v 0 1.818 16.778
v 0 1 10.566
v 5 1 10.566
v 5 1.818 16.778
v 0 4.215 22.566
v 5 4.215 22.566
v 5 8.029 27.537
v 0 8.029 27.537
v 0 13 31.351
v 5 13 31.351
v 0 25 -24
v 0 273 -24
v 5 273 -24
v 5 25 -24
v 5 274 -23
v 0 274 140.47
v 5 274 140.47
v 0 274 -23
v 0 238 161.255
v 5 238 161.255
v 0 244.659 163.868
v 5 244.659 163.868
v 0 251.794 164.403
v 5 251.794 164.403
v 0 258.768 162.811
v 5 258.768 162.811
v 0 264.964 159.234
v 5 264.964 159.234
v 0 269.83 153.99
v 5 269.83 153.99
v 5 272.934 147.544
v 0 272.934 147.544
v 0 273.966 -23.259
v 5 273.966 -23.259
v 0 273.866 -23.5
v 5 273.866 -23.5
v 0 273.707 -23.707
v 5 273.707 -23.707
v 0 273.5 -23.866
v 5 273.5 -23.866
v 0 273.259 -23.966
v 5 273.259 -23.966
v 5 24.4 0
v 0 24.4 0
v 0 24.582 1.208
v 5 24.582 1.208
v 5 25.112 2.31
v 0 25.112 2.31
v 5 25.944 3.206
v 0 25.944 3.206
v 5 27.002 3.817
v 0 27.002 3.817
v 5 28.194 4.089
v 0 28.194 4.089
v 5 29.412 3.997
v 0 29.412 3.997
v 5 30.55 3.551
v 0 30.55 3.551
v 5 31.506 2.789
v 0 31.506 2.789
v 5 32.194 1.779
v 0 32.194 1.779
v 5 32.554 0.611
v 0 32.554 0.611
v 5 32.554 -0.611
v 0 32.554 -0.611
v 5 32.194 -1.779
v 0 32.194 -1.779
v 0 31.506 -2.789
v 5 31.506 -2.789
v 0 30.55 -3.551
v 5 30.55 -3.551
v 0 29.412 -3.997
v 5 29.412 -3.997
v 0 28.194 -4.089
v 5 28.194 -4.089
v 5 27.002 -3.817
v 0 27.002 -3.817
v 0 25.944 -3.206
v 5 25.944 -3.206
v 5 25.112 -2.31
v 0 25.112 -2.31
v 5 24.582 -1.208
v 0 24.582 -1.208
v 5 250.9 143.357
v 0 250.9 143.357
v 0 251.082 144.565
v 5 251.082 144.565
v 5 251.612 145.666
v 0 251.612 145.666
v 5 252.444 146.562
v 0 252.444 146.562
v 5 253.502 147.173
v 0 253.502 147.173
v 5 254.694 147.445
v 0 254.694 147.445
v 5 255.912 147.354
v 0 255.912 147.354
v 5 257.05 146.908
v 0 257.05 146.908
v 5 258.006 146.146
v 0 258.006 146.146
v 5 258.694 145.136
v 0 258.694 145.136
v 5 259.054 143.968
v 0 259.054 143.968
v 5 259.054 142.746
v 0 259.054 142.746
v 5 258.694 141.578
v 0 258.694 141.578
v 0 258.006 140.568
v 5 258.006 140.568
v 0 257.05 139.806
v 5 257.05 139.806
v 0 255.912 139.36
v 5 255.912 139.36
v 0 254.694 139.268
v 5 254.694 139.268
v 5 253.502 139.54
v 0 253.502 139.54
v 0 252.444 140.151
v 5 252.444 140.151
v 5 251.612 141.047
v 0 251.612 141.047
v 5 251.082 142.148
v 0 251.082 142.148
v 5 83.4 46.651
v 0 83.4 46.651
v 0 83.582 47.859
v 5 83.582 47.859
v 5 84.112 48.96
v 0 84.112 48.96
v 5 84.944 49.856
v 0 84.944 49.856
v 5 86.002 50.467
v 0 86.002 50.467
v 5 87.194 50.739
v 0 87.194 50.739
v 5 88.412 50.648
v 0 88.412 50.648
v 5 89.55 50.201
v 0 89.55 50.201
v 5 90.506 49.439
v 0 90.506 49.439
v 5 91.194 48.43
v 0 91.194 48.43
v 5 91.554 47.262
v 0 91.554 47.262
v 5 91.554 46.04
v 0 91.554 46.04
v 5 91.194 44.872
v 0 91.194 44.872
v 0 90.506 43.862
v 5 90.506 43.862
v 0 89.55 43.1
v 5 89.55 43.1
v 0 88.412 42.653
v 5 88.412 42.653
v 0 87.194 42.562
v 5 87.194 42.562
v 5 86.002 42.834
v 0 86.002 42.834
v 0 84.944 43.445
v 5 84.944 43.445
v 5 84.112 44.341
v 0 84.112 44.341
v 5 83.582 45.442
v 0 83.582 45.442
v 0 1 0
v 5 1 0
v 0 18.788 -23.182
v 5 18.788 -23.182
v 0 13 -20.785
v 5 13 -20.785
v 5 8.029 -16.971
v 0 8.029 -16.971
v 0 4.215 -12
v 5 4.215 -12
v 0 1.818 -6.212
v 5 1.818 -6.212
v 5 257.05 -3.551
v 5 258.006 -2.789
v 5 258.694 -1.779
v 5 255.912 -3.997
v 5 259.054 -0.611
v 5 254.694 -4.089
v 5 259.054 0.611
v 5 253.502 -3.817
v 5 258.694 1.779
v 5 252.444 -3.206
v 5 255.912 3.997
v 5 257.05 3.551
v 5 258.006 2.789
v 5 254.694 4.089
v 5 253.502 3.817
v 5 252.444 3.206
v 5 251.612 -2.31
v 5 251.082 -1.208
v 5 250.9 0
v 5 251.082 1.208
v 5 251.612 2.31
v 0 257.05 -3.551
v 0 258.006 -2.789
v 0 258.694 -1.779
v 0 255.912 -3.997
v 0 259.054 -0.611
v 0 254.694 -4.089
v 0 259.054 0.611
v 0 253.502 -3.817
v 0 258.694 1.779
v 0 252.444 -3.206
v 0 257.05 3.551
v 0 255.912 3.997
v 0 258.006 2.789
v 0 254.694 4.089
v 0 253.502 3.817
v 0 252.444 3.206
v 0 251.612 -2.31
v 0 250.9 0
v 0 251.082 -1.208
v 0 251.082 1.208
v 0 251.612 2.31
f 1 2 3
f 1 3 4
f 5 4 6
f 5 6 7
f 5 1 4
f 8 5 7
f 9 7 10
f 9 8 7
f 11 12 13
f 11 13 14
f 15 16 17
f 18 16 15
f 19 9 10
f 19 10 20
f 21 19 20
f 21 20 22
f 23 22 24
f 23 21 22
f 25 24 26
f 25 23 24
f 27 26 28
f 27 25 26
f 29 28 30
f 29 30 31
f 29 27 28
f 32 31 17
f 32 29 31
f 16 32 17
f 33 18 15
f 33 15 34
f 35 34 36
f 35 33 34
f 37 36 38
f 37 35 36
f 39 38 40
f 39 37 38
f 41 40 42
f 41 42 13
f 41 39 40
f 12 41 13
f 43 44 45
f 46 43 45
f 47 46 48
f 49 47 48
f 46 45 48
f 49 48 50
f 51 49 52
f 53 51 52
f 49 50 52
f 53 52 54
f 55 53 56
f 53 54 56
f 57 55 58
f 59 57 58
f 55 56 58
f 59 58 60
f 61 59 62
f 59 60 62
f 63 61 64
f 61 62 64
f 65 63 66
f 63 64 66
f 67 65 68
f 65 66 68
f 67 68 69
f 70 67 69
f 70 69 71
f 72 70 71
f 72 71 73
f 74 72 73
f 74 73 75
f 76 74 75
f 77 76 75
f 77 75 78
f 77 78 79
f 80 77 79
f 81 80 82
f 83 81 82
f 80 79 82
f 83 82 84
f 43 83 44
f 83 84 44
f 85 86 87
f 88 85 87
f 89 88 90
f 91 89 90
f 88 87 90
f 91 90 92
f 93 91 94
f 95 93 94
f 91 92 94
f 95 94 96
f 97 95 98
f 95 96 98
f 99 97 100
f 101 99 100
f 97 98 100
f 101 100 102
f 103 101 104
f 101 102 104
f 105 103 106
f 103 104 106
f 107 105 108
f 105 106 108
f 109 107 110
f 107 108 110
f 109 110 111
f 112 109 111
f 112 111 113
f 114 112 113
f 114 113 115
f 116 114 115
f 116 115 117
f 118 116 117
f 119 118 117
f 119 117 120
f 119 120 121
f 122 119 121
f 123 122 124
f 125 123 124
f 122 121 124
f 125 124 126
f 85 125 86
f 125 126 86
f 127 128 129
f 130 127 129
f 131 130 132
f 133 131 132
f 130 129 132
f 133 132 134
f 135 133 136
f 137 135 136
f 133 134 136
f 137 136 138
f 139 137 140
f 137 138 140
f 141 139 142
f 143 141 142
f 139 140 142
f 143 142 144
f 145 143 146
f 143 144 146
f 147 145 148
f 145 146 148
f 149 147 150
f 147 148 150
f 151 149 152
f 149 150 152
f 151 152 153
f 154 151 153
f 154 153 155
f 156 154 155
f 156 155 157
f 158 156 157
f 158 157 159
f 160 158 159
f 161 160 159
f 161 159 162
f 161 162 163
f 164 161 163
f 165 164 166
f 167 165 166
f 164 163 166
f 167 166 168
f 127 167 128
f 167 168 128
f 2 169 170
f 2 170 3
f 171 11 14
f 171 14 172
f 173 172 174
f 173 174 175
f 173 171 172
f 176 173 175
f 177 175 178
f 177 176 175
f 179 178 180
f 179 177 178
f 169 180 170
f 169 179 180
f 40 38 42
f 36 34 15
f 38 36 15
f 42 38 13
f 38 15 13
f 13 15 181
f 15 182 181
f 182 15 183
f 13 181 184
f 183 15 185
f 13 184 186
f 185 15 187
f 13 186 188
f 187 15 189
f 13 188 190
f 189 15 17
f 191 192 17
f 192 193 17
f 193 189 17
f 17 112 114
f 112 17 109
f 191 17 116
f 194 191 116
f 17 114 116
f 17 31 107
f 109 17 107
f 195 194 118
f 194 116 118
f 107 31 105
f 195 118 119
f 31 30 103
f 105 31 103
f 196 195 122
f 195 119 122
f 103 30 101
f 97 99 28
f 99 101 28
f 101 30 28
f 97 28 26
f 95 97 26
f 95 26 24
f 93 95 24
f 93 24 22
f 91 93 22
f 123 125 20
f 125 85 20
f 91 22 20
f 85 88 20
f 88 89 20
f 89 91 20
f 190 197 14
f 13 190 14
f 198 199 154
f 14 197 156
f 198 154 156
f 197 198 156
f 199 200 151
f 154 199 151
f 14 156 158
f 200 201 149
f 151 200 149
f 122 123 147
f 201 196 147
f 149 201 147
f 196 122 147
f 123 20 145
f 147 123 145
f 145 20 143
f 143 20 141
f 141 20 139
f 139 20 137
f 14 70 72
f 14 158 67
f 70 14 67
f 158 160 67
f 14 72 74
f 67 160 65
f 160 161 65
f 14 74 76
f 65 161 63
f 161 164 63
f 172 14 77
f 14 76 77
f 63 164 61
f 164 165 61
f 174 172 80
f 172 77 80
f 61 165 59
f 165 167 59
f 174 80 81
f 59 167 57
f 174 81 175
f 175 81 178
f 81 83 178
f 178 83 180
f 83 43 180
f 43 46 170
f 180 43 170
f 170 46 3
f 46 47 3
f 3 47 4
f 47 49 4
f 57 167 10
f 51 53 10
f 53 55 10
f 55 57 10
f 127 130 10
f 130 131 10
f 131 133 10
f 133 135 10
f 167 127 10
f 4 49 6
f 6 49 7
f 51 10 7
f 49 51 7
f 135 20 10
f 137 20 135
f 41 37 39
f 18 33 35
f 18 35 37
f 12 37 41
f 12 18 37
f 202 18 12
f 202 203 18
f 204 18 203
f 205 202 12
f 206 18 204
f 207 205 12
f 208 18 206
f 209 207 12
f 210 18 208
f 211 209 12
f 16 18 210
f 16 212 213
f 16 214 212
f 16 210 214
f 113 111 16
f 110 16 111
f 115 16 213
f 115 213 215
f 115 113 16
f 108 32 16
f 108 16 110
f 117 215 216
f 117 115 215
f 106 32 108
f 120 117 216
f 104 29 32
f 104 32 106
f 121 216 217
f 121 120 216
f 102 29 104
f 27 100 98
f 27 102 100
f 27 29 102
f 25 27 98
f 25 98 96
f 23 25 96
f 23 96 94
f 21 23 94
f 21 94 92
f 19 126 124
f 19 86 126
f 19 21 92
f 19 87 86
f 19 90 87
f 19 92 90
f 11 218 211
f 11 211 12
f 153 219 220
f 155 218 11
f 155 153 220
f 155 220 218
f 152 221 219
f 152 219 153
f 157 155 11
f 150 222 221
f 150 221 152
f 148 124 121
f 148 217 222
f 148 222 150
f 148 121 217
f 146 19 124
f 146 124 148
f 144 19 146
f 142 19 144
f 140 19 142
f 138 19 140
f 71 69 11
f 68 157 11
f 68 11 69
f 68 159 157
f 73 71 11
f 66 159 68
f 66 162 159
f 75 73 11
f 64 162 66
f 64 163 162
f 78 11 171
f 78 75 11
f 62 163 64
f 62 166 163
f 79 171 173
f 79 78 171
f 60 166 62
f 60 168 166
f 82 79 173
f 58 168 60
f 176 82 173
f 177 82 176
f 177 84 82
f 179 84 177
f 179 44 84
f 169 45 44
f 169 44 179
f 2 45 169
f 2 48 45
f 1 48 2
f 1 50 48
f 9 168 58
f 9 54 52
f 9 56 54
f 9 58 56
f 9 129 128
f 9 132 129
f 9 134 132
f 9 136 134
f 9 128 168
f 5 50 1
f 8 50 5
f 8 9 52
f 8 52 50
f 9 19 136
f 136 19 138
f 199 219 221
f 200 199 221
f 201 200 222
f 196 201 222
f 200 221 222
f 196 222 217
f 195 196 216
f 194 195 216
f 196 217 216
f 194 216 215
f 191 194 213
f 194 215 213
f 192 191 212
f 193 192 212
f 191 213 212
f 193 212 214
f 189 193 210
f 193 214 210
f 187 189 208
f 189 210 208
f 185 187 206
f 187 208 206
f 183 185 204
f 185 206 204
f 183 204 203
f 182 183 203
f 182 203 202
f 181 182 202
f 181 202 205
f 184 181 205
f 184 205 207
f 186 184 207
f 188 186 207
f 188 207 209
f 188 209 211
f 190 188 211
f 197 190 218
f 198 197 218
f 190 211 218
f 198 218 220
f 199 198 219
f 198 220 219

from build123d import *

# Parameters (mm, degrees)
SKETCH1_R           = 4.1
BOSS_EXTRUDE1_DEPTH = 5


with BuildPart() as part:
    # Sketch1 → Boss-Extrude1 (new body)
    with BuildSketch(Plane(origin=(0, 0, 0), x_dir=(0, -1, 0), z_dir=(-1, 0, 0))):
        with BuildLine():
            Line((-13, 31.350852961), (-238, 161.254663529))
            ThreePointArc((-238, 161.254663529), (-262, 161.254663529), (-274, 140.470053838))
            Line((-274, 140.470053838), (-274, -23))
            ThreePointArc((-274, -23), (-273.707106781, -23.707106781), (-273, -24))
            Line((-273, -24), (-25, -24))
            ThreePointArc((-25, -24), (-8.029437252, -16.970562748), (-1, 0))
            Line((-1, 0), (-1, 10.56624327))
            ThreePointArc((-1, 10.56624327), (-4.215390309, 22.56624327), (-13, 31.350852961))
        make_face()
        with Locations((-255, 143.356805184)):
            Circle(SKETCH1_R, mode=Mode.SUBTRACT)
        with Locations((-255, 0)):
            Circle(SKETCH1_R, mode=Mode.SUBTRACT)
        with Locations((-28.5, 0)):
            Circle(SKETCH1_R, mode=Mode.SUBTRACT)
        with Locations((-87.5, 46.650635095)):
            Circle(SKETCH1_R, mode=Mode.SUBTRACT)
    extrude(amount=-BOSS_EXTRUDE1_DEPTH)


solid = part.part
